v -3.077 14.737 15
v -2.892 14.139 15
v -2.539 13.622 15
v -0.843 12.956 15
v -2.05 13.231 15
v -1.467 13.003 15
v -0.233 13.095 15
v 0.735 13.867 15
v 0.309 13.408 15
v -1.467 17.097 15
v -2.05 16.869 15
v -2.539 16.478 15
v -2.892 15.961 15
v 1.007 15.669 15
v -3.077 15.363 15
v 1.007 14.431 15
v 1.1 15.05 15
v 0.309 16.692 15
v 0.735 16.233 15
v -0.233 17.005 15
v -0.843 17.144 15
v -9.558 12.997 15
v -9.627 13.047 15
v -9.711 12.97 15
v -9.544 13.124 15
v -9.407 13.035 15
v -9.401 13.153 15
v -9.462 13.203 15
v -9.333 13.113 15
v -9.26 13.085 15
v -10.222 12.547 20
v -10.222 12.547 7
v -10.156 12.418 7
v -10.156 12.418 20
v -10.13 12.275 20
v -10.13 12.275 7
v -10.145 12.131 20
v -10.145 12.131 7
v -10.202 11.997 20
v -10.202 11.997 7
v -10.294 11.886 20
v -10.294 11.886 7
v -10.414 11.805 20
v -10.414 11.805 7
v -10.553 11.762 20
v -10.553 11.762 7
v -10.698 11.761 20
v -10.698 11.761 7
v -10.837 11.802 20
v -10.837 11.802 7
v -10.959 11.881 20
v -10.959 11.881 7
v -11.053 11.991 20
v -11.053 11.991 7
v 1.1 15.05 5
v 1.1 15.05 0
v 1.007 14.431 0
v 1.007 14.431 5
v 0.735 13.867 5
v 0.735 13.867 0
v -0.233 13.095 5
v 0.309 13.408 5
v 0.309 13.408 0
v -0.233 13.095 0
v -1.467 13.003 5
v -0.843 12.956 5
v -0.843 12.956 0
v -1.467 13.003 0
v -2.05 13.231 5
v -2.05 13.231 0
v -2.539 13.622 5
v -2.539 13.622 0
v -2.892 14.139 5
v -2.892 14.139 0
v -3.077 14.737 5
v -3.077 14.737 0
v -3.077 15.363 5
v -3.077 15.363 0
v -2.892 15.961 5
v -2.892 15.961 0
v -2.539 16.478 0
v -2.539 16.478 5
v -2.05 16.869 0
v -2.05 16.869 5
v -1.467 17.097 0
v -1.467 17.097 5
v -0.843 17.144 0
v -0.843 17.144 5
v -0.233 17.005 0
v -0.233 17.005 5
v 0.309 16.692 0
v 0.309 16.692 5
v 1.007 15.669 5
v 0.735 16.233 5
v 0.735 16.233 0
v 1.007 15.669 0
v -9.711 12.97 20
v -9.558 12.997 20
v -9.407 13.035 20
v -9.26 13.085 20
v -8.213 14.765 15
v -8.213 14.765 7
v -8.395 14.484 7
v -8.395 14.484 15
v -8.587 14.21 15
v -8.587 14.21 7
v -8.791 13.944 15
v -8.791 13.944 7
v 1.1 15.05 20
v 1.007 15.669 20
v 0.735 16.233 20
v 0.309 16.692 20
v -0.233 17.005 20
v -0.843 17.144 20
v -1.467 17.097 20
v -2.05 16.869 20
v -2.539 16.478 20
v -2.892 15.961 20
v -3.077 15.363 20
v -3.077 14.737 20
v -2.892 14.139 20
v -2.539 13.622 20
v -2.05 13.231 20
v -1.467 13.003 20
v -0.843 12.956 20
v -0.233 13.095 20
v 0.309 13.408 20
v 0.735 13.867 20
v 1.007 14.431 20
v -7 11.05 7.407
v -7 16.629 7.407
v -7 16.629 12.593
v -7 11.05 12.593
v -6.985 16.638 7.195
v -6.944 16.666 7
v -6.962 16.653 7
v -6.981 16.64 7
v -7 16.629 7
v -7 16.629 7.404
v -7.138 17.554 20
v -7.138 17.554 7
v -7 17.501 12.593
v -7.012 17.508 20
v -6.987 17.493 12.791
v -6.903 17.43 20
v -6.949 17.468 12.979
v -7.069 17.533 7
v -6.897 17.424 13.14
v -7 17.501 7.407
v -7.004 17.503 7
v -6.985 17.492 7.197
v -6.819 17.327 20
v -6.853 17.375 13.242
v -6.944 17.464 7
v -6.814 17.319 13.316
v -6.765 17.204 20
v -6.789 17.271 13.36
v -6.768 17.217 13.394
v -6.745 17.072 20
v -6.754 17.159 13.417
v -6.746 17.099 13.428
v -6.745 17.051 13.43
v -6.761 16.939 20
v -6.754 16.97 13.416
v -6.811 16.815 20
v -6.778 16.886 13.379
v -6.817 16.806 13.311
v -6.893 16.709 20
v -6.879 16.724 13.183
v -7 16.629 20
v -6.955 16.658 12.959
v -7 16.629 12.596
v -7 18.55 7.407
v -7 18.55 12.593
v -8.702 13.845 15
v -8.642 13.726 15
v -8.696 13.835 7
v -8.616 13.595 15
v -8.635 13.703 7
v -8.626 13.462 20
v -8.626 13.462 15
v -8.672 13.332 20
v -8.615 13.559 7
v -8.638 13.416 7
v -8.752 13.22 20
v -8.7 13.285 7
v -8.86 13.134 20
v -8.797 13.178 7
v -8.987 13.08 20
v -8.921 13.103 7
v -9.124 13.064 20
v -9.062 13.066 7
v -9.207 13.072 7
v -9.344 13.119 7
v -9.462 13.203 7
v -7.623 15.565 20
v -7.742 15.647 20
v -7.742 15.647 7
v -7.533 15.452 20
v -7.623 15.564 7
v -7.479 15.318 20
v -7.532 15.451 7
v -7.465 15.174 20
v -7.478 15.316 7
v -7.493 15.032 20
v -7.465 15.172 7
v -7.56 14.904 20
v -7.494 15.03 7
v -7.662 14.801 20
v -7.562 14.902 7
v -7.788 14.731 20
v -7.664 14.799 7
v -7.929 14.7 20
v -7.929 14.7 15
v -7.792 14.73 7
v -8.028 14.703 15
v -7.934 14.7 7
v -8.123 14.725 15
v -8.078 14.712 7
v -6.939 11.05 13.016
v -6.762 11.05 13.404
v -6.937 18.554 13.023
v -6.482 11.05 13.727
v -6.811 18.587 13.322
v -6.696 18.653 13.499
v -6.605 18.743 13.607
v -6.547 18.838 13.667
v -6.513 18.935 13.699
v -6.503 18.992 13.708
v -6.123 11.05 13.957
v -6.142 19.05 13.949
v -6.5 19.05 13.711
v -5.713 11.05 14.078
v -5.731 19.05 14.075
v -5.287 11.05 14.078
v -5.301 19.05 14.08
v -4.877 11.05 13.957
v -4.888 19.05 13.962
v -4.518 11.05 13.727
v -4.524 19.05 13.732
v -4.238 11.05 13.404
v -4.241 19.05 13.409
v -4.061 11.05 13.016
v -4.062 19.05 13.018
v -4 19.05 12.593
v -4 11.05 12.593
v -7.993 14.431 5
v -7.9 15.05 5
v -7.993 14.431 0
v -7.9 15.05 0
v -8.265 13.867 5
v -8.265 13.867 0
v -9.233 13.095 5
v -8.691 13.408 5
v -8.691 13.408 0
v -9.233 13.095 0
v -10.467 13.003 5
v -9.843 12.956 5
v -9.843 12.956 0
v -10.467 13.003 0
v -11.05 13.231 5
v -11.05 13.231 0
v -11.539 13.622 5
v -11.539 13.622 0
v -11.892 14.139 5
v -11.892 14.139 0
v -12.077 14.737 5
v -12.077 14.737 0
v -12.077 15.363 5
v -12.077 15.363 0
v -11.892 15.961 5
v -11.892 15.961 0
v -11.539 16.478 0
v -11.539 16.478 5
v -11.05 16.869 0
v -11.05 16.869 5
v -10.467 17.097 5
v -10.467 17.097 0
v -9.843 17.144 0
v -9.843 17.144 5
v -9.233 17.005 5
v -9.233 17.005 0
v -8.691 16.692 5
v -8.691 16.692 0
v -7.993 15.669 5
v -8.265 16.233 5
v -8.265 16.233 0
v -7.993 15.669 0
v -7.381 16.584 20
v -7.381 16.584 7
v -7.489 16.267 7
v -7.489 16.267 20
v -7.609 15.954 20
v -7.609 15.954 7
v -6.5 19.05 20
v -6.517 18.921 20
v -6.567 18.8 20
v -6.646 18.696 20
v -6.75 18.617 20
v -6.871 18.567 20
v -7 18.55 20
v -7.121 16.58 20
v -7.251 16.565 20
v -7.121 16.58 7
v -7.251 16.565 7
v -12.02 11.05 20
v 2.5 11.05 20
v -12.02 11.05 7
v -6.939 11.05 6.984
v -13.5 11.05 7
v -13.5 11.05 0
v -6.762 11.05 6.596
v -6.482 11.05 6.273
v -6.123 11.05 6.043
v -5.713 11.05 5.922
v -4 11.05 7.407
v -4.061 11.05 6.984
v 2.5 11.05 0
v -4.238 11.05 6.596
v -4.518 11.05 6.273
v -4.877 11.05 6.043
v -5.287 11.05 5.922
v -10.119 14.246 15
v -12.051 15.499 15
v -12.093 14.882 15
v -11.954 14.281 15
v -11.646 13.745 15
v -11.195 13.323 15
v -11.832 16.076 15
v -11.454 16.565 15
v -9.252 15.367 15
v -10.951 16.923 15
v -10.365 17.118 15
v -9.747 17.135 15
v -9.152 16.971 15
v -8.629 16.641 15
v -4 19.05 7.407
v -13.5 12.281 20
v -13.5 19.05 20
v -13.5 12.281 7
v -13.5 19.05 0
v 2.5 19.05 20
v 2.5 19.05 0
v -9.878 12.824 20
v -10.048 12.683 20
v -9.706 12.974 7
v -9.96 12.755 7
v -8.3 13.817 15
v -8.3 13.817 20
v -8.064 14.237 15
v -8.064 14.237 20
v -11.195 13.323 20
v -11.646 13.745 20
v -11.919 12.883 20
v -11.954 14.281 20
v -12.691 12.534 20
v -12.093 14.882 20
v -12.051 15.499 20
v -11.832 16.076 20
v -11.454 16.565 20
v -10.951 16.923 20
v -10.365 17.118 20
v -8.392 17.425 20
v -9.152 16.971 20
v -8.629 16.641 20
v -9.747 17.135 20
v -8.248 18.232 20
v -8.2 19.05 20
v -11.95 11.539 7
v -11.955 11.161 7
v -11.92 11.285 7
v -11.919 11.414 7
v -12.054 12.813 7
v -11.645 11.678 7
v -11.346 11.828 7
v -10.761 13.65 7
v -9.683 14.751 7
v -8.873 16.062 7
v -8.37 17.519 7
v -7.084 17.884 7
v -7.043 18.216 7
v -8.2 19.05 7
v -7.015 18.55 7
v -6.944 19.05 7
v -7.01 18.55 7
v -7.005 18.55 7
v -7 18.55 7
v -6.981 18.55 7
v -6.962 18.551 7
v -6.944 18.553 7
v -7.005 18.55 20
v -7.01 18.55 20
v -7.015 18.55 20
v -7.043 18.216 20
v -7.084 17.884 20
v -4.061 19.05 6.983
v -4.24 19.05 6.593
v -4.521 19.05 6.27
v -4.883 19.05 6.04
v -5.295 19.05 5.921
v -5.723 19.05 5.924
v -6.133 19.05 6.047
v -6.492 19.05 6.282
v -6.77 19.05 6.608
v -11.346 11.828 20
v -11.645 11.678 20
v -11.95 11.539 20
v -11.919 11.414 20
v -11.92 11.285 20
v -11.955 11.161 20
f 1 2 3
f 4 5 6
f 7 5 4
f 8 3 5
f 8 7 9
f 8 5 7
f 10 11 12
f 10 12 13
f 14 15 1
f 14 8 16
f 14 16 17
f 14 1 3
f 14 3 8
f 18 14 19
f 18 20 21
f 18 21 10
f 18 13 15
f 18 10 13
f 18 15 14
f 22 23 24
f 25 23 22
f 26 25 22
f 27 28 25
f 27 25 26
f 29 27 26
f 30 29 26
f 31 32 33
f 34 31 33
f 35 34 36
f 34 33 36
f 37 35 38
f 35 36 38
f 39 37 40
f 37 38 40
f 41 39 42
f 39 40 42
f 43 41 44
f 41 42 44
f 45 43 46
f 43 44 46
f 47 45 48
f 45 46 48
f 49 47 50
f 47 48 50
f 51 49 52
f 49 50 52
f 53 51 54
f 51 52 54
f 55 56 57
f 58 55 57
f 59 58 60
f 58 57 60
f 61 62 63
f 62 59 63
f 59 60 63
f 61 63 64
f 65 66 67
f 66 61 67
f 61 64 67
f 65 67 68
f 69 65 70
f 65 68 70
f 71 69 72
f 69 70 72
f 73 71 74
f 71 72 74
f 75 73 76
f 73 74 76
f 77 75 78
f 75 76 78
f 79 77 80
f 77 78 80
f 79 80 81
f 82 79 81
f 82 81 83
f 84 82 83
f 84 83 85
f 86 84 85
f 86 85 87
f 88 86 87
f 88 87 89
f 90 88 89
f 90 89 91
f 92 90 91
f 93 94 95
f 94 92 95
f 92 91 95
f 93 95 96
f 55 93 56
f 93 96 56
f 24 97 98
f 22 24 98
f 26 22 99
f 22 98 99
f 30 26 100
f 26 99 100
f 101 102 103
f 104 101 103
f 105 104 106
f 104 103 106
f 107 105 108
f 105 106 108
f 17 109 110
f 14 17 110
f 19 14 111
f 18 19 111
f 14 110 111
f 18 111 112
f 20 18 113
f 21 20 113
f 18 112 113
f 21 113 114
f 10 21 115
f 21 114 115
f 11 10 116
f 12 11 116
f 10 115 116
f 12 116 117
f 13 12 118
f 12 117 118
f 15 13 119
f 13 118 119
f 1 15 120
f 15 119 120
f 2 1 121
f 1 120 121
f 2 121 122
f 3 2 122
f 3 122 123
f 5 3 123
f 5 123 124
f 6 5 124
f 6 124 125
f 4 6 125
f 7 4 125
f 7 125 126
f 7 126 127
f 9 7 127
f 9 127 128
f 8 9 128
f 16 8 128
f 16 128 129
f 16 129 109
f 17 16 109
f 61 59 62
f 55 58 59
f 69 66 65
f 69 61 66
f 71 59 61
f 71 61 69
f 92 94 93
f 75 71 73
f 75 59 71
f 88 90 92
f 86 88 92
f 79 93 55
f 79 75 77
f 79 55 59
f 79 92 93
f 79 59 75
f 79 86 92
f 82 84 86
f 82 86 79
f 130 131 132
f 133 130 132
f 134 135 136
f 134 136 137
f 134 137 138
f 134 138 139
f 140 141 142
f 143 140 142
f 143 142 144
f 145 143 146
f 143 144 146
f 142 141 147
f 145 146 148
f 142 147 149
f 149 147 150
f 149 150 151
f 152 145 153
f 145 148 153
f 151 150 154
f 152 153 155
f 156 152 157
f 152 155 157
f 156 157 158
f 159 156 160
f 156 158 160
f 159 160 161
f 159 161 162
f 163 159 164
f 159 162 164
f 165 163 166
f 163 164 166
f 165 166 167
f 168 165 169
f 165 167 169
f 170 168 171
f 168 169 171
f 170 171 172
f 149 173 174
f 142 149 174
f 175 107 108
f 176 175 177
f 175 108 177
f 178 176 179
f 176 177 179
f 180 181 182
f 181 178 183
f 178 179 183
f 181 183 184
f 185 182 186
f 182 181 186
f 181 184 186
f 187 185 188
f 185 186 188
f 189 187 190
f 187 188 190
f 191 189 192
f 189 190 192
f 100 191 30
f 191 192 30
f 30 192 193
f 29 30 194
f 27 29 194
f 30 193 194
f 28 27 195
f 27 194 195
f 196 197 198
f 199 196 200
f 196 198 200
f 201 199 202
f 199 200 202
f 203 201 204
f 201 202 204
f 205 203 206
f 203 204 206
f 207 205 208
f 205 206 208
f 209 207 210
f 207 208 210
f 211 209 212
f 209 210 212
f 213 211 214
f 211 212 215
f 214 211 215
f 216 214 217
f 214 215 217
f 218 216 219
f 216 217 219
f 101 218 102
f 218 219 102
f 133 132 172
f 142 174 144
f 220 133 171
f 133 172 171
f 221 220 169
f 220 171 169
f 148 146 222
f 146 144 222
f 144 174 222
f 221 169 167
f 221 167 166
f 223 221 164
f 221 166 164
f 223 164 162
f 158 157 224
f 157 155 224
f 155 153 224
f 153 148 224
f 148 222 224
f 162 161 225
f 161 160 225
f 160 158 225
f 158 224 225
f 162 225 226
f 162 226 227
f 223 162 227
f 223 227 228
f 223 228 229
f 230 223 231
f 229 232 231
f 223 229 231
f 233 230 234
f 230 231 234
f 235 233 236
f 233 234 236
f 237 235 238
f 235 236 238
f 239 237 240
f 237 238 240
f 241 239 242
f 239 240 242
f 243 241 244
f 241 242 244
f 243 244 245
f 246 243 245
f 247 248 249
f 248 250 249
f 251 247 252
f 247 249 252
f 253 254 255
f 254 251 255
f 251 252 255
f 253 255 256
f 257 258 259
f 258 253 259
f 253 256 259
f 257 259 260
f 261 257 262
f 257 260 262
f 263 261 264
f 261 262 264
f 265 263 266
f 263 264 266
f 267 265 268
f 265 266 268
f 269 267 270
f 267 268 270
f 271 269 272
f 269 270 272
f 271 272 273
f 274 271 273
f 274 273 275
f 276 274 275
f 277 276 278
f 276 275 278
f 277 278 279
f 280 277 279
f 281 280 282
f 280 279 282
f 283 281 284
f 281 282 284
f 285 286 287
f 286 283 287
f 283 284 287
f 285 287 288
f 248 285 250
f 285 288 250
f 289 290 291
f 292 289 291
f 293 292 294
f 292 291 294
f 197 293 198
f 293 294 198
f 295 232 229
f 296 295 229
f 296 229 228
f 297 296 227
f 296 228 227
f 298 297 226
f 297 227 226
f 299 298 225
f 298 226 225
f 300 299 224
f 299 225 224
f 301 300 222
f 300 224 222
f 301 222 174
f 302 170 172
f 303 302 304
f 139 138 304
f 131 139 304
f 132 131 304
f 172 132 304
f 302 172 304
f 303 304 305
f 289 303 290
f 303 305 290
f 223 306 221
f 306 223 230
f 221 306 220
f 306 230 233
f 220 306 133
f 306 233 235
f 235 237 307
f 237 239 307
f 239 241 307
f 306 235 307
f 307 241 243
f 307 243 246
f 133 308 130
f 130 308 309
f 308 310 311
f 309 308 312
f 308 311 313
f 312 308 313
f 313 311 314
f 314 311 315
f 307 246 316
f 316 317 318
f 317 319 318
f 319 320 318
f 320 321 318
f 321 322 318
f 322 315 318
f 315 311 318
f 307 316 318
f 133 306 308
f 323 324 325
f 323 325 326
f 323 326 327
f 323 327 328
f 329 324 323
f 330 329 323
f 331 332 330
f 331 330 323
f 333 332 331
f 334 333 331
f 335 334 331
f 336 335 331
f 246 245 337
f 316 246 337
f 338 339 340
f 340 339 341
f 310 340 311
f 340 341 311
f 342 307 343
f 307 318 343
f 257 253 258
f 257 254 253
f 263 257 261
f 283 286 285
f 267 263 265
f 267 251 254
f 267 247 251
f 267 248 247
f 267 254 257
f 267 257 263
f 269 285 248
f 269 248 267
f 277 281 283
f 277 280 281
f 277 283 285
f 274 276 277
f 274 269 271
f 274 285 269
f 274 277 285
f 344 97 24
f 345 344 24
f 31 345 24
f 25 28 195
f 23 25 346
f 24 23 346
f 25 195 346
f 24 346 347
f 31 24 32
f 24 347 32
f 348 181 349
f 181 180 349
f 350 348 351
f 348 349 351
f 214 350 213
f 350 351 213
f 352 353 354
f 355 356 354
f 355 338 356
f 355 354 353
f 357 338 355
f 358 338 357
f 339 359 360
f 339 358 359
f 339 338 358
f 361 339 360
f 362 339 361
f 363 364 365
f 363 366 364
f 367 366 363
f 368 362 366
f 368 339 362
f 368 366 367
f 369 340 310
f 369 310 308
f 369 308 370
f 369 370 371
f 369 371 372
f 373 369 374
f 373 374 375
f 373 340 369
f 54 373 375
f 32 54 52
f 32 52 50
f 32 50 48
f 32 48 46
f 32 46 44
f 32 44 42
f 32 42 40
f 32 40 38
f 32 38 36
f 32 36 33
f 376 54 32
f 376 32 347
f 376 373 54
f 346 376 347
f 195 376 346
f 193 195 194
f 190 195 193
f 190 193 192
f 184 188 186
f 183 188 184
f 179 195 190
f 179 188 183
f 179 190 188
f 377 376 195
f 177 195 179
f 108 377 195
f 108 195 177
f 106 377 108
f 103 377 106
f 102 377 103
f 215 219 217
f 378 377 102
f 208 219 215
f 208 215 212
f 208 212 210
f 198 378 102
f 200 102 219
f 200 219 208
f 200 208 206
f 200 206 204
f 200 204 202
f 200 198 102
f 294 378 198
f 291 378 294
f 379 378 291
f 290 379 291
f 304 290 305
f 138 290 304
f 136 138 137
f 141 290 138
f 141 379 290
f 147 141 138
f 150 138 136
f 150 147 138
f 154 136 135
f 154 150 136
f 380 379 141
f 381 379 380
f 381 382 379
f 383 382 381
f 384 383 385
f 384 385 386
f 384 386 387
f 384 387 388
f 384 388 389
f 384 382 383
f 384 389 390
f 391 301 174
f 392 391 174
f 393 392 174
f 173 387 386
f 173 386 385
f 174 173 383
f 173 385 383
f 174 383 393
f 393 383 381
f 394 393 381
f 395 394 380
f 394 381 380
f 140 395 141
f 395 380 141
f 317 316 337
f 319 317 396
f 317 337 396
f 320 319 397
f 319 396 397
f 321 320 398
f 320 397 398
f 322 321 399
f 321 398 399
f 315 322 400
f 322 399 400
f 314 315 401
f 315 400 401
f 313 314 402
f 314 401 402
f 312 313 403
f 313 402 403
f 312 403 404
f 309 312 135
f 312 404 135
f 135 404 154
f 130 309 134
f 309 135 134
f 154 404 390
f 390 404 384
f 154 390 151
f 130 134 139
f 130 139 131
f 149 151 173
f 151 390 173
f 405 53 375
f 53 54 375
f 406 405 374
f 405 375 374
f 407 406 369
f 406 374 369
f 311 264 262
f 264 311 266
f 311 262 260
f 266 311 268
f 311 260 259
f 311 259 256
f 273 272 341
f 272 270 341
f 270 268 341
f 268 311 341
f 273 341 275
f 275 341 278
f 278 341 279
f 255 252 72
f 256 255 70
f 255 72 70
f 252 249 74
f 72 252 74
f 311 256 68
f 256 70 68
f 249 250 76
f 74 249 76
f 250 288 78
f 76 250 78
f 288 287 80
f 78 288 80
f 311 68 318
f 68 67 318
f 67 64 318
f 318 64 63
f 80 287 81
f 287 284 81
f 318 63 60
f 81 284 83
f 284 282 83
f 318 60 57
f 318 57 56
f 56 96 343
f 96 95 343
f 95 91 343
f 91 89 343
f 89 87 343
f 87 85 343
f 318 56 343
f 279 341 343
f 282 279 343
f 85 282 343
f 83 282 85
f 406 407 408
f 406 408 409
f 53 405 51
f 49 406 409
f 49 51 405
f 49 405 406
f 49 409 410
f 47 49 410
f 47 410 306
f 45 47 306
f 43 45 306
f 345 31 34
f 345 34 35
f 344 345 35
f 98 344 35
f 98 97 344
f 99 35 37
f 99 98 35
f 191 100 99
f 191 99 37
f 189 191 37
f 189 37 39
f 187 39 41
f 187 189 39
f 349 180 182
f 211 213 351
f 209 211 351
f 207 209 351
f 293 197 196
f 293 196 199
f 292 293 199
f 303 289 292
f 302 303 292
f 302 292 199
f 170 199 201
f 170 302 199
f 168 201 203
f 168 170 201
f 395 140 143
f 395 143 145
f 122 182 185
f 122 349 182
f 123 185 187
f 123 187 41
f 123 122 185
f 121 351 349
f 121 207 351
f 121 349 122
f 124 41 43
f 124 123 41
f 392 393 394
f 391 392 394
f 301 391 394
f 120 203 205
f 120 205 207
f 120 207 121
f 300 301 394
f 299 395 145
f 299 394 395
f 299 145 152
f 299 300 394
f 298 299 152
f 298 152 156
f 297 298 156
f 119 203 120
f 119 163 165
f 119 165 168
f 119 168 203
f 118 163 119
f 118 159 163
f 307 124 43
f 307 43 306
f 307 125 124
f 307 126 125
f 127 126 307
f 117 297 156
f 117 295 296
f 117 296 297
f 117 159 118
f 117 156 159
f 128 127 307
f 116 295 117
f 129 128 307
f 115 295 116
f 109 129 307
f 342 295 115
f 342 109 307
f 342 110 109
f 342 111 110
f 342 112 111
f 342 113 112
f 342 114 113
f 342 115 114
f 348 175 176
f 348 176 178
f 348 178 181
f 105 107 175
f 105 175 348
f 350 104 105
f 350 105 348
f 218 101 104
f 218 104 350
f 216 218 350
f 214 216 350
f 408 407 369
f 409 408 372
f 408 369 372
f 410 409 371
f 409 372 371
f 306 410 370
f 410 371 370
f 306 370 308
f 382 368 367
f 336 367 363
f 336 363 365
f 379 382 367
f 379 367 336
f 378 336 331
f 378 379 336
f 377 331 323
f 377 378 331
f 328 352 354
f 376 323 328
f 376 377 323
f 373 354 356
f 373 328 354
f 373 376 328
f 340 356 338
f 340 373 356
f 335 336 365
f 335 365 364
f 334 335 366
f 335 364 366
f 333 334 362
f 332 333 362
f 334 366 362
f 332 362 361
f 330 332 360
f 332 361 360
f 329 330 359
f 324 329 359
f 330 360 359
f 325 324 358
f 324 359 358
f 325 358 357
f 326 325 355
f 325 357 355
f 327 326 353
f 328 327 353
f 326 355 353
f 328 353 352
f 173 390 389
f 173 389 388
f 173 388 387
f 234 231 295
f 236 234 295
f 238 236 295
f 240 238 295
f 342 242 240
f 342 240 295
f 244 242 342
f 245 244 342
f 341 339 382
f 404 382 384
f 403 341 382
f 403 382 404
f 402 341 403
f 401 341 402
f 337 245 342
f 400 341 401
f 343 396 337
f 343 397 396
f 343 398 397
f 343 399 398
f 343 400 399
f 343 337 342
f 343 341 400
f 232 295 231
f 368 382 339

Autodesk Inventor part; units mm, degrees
ref_plane "YZ Plane" through (0, 0, 0) normal (1, 0, 0) x (0, 1, 0)
ref_plane "XZ Plane" through (0, 0, 0) normal (0, 1, 0) x (-1, 0, 0)
sketch "Эскиз1" plane through (0, 0, 0) normal (0, 0, 1) x (1, 0, 0)
  line L0 (13.5, 19.05) -> (-13.5, 19.05) construction
  circle A0 centre (-7.5, -8) radius 1.6 construction
  circle A1 centre (7.5, -8) radius 1.6 construction
  line L1 (-13.5, 19.05) -> (2.5, 19.05)
  line L2 (-13.5, 19.05) -> (-13.5, 9.05)
  line L3 (-13.5, 11.05) -> (2.5, 11.05)
  line L4 (-13.5, 11.05) -> (-13.5, 9.05)
  line L5 (2.5, 11.05) -> (2.5, 19.05)
  point P0 (2.5, 15.05)
  dimension "d3" = 0
  dimension "d15" = 16
extrude "Выдавливание1" add sketch "Эскиз1" along normal blind 20
ref_plane "РабПлоскость1" through (0, 0, 10) normal (0, 0, -1) x (-1, 0, 0)
sketch "Эскиз4" plane through (0, 0, 20) normal (0, 0, 1) x (1, 0, 0)
  line L0 (2.5, 11.05) -> (2.5, 19.05) construction
  line L1 (2.5, 15.05) -> (-13.5, 15.05) construction
  line L2 (-13.5, 19.05) -> (-13.5, 11.05) construction
  circle A0 centre (-10, 15.05) radius 2.1
  circle A1 centre (-1, 15.05) radius 2.1
  point P0 (0, 0)
  point P1 (-13.5, 9.05)
  dimension "d16" = 4.2
  dimension "d17" = 4.2
  dimension "d18" = 3.5
  dimension "d19" = 3.5
extrude "Выдавливание4" cut sketch "Эскиз4" against normal blind 5
mirror "Зеркальное отражение2" about plane through (0, 0, 10) normal (0, 0, -1) of "Выдавливание4"
sketch "Эскиз5" plane through (-13.5, 19.05, 0) normal (0, 1, 0) x (1, 0, 0)
  line L0 (16, 0) -> (0, 0) construction
  line L1 (0, 0) -> (0, -20) construction
  line L2 (16, -20) -> (0, -20) construction
  line L3 (16, 0) -> (16, -20) construction
  line L4 (8, -7.407) -> (8, -12.593) construction
  line L5 (6.5, -7.407) -> (6.5, -12.593)
  line L6 (9.5, -12.593) -> (9.5, -7.407)
  arc A0 (9.5, -7.407) -> (6.5, -7.407) centre (8, -7.407) ccw
  arc A1 (6.5, -12.593) -> (9.5, -12.593) centre (8, -12.593) ccw
  point P0 (13.5, 0)
  point P1 (8, -10)
  dimension "d22" = 3
extrude "Выдавливание5" cut sketch "Эскиз5" against normal blind 20
ref_plane "РабПлоскость2" through (0, 0, 10) normal (0, 0, 1) x (1, 0, 0)
sketch "Эскиз7" plane through (0, 0, 10) normal (0, 0, 1) x (1, 0, 0)
  line L0 (-7, 19.05) -> (-7, 11.05) construction
  arc A0 (-13.5, 11.05) -> (-12.8908, 11.202) centre (-15.1731, 19.05) ccw
  arc A1 (-7, 19.55) -> (-7.0153, 18.5502) centre (-7, 19.05) ccw construction
  line L1 (-7, 19.05) -> (-7, 19.55) construction
  arc A2 (-7, 16.629) -> (-7.1382, 17.5535) centre (-7.2447, 17.065) ccw
  arc A3 (-7.7422, 15.6469) -> (-8.2131, 14.7653) centre (-7.9642, 15.1989) ccw construction
  arc A4 (-8.7912, 13.9441) -> (-9.4621, 13.2033) centre (-9.1153, 13.5634) ccw construction
  arc A5 (-10.2223, 12.547) -> (-11.0531, 11.9913) centre (-10.6292, 12.2564) ccw construction
  arc A6 (-11.9499, 11.5393) -> (-12.8908, 11.202) centre (-12.4152, 11.3563) ccw construction
  arc A7 (-7, 18.55) -> (-6.5, 19.05) centre (-7, 19.05) ccw
  arc A8 (-7.3809, 16.5839) -> (-7, 16.629) centre (-7.2447, 17.065) ccw
  arc A9 (-7.1382, 17.5535) -> (-7.3809, 16.5839) centre (-7.2447, 17.065) ccw construction
  arc A10 (-8.2131, 14.7653) -> (-7.7422, 15.6469) centre (-7.9642, 15.1989) ccw
  arc A11 (-9.4621, 13.2033) -> (-8.7912, 13.9441) centre (-9.1153, 13.5634) ccw
  arc A12 (-11.0531, 11.9913) -> (-10.2223, 12.547) centre (-10.6292, 12.2564) ccw
  arc A13 (-12.8908, 11.202) -> (-11.9499, 11.5393) centre (-12.4152, 11.3563) ccw
  line L2 (-4, 11.05) -> (-7, 11.05) projected
  arc A14 (-7.0153, 18.5502) -> (-7, 19.05) centre (-15.1731, 19.05) ccw construction
  arc A15 (-7.1382, 17.5535) -> (-7.0153, 18.5502) centre (-15.1731, 19.05) ccw
  arc A16 (-7.7422, 15.6469) -> (-7.3809, 16.5839) centre (-15.1731, 19.05) ccw
  arc A17 (-7.3809, 16.5839) -> (-7.1382, 17.5535) centre (-15.1731, 19.05) ccw construction
  arc A18 (-8.2131, 14.7653) -> (-7.7422, 15.6469) centre (-15.1731, 19.05) ccw construction
  arc A19 (-8.7912, 13.9441) -> (-8.2131, 14.7653) centre (-15.1731, 19.05) ccw
  arc A20 (-9.4621, 13.2033) -> (-8.7912, 13.9441) centre (-15.1731, 19.05) ccw construction
  arc A21 (-11.0531, 11.9913) -> (-10.2223, 12.547) centre (-15.1731, 19.05) ccw construction
  arc A22 (-11.9499, 11.5393) -> (-11.0531, 11.9913) centre (-15.1731, 19.05) ccw
  arc A23 (-12.8908, 11.202) -> (-11.9499, 11.5393) centre (-15.1731, 19.05) ccw construction
  arc A24 (-10.2223, 12.547) -> (-9.4621, 13.2033) centre (-15.1731, 19.05) ccw
  arc A25 (-13.5, 12.2806) -> (-8.2, 19.05) centre (-15.1731, 19.05) ccw
  line L3 (-8.2, 19.05) -> (-6.5, 19.05)
  line L4 (2.5, 19.05) -> (-13.5, 19.05) projected
  line L5 (-13.5, 19.05) -> (-13.5, 11.05) projected
  line L6 (-13.5, 11.05) -> (-13.5, 12.2806)
  arc A26 (-7.0153, 18.5502) -> (-7, 18.55) centre (-7, 19.05) ccw
  line L7 (-13.5, 11.05) -> (-12.4152, 10.8563)
  point P0 (0, 0)
  point P1 (-7, 19.05)
  point P2 (-7.0153, 18.5502)
  dimension "d25" = 1
  dimension "d34" = 1
  dimension "d36" = 1
  dimension "d39" = 1
  dimension "d40" = 1
  dimension "d41" = 1
  dimension "d42" = 1
  dimension "d43" = 1
  dimension "d44" = 1
  dimension "d45" = 1
  dimension "d46" = 1
  dimension "d48" = 1.2
extrude "Выдавливание6" cut sketch "Эскиз7" along normal blind 12 and the other way blind 3 contours L5 A25 L3 A7 A26 A15 A2 A8 A16 A10 A19 A11 A24 A12 A22 A13 L7 A0 | A0 A13 L7
properties part number "стена_каретки" material "Полипропилен"
